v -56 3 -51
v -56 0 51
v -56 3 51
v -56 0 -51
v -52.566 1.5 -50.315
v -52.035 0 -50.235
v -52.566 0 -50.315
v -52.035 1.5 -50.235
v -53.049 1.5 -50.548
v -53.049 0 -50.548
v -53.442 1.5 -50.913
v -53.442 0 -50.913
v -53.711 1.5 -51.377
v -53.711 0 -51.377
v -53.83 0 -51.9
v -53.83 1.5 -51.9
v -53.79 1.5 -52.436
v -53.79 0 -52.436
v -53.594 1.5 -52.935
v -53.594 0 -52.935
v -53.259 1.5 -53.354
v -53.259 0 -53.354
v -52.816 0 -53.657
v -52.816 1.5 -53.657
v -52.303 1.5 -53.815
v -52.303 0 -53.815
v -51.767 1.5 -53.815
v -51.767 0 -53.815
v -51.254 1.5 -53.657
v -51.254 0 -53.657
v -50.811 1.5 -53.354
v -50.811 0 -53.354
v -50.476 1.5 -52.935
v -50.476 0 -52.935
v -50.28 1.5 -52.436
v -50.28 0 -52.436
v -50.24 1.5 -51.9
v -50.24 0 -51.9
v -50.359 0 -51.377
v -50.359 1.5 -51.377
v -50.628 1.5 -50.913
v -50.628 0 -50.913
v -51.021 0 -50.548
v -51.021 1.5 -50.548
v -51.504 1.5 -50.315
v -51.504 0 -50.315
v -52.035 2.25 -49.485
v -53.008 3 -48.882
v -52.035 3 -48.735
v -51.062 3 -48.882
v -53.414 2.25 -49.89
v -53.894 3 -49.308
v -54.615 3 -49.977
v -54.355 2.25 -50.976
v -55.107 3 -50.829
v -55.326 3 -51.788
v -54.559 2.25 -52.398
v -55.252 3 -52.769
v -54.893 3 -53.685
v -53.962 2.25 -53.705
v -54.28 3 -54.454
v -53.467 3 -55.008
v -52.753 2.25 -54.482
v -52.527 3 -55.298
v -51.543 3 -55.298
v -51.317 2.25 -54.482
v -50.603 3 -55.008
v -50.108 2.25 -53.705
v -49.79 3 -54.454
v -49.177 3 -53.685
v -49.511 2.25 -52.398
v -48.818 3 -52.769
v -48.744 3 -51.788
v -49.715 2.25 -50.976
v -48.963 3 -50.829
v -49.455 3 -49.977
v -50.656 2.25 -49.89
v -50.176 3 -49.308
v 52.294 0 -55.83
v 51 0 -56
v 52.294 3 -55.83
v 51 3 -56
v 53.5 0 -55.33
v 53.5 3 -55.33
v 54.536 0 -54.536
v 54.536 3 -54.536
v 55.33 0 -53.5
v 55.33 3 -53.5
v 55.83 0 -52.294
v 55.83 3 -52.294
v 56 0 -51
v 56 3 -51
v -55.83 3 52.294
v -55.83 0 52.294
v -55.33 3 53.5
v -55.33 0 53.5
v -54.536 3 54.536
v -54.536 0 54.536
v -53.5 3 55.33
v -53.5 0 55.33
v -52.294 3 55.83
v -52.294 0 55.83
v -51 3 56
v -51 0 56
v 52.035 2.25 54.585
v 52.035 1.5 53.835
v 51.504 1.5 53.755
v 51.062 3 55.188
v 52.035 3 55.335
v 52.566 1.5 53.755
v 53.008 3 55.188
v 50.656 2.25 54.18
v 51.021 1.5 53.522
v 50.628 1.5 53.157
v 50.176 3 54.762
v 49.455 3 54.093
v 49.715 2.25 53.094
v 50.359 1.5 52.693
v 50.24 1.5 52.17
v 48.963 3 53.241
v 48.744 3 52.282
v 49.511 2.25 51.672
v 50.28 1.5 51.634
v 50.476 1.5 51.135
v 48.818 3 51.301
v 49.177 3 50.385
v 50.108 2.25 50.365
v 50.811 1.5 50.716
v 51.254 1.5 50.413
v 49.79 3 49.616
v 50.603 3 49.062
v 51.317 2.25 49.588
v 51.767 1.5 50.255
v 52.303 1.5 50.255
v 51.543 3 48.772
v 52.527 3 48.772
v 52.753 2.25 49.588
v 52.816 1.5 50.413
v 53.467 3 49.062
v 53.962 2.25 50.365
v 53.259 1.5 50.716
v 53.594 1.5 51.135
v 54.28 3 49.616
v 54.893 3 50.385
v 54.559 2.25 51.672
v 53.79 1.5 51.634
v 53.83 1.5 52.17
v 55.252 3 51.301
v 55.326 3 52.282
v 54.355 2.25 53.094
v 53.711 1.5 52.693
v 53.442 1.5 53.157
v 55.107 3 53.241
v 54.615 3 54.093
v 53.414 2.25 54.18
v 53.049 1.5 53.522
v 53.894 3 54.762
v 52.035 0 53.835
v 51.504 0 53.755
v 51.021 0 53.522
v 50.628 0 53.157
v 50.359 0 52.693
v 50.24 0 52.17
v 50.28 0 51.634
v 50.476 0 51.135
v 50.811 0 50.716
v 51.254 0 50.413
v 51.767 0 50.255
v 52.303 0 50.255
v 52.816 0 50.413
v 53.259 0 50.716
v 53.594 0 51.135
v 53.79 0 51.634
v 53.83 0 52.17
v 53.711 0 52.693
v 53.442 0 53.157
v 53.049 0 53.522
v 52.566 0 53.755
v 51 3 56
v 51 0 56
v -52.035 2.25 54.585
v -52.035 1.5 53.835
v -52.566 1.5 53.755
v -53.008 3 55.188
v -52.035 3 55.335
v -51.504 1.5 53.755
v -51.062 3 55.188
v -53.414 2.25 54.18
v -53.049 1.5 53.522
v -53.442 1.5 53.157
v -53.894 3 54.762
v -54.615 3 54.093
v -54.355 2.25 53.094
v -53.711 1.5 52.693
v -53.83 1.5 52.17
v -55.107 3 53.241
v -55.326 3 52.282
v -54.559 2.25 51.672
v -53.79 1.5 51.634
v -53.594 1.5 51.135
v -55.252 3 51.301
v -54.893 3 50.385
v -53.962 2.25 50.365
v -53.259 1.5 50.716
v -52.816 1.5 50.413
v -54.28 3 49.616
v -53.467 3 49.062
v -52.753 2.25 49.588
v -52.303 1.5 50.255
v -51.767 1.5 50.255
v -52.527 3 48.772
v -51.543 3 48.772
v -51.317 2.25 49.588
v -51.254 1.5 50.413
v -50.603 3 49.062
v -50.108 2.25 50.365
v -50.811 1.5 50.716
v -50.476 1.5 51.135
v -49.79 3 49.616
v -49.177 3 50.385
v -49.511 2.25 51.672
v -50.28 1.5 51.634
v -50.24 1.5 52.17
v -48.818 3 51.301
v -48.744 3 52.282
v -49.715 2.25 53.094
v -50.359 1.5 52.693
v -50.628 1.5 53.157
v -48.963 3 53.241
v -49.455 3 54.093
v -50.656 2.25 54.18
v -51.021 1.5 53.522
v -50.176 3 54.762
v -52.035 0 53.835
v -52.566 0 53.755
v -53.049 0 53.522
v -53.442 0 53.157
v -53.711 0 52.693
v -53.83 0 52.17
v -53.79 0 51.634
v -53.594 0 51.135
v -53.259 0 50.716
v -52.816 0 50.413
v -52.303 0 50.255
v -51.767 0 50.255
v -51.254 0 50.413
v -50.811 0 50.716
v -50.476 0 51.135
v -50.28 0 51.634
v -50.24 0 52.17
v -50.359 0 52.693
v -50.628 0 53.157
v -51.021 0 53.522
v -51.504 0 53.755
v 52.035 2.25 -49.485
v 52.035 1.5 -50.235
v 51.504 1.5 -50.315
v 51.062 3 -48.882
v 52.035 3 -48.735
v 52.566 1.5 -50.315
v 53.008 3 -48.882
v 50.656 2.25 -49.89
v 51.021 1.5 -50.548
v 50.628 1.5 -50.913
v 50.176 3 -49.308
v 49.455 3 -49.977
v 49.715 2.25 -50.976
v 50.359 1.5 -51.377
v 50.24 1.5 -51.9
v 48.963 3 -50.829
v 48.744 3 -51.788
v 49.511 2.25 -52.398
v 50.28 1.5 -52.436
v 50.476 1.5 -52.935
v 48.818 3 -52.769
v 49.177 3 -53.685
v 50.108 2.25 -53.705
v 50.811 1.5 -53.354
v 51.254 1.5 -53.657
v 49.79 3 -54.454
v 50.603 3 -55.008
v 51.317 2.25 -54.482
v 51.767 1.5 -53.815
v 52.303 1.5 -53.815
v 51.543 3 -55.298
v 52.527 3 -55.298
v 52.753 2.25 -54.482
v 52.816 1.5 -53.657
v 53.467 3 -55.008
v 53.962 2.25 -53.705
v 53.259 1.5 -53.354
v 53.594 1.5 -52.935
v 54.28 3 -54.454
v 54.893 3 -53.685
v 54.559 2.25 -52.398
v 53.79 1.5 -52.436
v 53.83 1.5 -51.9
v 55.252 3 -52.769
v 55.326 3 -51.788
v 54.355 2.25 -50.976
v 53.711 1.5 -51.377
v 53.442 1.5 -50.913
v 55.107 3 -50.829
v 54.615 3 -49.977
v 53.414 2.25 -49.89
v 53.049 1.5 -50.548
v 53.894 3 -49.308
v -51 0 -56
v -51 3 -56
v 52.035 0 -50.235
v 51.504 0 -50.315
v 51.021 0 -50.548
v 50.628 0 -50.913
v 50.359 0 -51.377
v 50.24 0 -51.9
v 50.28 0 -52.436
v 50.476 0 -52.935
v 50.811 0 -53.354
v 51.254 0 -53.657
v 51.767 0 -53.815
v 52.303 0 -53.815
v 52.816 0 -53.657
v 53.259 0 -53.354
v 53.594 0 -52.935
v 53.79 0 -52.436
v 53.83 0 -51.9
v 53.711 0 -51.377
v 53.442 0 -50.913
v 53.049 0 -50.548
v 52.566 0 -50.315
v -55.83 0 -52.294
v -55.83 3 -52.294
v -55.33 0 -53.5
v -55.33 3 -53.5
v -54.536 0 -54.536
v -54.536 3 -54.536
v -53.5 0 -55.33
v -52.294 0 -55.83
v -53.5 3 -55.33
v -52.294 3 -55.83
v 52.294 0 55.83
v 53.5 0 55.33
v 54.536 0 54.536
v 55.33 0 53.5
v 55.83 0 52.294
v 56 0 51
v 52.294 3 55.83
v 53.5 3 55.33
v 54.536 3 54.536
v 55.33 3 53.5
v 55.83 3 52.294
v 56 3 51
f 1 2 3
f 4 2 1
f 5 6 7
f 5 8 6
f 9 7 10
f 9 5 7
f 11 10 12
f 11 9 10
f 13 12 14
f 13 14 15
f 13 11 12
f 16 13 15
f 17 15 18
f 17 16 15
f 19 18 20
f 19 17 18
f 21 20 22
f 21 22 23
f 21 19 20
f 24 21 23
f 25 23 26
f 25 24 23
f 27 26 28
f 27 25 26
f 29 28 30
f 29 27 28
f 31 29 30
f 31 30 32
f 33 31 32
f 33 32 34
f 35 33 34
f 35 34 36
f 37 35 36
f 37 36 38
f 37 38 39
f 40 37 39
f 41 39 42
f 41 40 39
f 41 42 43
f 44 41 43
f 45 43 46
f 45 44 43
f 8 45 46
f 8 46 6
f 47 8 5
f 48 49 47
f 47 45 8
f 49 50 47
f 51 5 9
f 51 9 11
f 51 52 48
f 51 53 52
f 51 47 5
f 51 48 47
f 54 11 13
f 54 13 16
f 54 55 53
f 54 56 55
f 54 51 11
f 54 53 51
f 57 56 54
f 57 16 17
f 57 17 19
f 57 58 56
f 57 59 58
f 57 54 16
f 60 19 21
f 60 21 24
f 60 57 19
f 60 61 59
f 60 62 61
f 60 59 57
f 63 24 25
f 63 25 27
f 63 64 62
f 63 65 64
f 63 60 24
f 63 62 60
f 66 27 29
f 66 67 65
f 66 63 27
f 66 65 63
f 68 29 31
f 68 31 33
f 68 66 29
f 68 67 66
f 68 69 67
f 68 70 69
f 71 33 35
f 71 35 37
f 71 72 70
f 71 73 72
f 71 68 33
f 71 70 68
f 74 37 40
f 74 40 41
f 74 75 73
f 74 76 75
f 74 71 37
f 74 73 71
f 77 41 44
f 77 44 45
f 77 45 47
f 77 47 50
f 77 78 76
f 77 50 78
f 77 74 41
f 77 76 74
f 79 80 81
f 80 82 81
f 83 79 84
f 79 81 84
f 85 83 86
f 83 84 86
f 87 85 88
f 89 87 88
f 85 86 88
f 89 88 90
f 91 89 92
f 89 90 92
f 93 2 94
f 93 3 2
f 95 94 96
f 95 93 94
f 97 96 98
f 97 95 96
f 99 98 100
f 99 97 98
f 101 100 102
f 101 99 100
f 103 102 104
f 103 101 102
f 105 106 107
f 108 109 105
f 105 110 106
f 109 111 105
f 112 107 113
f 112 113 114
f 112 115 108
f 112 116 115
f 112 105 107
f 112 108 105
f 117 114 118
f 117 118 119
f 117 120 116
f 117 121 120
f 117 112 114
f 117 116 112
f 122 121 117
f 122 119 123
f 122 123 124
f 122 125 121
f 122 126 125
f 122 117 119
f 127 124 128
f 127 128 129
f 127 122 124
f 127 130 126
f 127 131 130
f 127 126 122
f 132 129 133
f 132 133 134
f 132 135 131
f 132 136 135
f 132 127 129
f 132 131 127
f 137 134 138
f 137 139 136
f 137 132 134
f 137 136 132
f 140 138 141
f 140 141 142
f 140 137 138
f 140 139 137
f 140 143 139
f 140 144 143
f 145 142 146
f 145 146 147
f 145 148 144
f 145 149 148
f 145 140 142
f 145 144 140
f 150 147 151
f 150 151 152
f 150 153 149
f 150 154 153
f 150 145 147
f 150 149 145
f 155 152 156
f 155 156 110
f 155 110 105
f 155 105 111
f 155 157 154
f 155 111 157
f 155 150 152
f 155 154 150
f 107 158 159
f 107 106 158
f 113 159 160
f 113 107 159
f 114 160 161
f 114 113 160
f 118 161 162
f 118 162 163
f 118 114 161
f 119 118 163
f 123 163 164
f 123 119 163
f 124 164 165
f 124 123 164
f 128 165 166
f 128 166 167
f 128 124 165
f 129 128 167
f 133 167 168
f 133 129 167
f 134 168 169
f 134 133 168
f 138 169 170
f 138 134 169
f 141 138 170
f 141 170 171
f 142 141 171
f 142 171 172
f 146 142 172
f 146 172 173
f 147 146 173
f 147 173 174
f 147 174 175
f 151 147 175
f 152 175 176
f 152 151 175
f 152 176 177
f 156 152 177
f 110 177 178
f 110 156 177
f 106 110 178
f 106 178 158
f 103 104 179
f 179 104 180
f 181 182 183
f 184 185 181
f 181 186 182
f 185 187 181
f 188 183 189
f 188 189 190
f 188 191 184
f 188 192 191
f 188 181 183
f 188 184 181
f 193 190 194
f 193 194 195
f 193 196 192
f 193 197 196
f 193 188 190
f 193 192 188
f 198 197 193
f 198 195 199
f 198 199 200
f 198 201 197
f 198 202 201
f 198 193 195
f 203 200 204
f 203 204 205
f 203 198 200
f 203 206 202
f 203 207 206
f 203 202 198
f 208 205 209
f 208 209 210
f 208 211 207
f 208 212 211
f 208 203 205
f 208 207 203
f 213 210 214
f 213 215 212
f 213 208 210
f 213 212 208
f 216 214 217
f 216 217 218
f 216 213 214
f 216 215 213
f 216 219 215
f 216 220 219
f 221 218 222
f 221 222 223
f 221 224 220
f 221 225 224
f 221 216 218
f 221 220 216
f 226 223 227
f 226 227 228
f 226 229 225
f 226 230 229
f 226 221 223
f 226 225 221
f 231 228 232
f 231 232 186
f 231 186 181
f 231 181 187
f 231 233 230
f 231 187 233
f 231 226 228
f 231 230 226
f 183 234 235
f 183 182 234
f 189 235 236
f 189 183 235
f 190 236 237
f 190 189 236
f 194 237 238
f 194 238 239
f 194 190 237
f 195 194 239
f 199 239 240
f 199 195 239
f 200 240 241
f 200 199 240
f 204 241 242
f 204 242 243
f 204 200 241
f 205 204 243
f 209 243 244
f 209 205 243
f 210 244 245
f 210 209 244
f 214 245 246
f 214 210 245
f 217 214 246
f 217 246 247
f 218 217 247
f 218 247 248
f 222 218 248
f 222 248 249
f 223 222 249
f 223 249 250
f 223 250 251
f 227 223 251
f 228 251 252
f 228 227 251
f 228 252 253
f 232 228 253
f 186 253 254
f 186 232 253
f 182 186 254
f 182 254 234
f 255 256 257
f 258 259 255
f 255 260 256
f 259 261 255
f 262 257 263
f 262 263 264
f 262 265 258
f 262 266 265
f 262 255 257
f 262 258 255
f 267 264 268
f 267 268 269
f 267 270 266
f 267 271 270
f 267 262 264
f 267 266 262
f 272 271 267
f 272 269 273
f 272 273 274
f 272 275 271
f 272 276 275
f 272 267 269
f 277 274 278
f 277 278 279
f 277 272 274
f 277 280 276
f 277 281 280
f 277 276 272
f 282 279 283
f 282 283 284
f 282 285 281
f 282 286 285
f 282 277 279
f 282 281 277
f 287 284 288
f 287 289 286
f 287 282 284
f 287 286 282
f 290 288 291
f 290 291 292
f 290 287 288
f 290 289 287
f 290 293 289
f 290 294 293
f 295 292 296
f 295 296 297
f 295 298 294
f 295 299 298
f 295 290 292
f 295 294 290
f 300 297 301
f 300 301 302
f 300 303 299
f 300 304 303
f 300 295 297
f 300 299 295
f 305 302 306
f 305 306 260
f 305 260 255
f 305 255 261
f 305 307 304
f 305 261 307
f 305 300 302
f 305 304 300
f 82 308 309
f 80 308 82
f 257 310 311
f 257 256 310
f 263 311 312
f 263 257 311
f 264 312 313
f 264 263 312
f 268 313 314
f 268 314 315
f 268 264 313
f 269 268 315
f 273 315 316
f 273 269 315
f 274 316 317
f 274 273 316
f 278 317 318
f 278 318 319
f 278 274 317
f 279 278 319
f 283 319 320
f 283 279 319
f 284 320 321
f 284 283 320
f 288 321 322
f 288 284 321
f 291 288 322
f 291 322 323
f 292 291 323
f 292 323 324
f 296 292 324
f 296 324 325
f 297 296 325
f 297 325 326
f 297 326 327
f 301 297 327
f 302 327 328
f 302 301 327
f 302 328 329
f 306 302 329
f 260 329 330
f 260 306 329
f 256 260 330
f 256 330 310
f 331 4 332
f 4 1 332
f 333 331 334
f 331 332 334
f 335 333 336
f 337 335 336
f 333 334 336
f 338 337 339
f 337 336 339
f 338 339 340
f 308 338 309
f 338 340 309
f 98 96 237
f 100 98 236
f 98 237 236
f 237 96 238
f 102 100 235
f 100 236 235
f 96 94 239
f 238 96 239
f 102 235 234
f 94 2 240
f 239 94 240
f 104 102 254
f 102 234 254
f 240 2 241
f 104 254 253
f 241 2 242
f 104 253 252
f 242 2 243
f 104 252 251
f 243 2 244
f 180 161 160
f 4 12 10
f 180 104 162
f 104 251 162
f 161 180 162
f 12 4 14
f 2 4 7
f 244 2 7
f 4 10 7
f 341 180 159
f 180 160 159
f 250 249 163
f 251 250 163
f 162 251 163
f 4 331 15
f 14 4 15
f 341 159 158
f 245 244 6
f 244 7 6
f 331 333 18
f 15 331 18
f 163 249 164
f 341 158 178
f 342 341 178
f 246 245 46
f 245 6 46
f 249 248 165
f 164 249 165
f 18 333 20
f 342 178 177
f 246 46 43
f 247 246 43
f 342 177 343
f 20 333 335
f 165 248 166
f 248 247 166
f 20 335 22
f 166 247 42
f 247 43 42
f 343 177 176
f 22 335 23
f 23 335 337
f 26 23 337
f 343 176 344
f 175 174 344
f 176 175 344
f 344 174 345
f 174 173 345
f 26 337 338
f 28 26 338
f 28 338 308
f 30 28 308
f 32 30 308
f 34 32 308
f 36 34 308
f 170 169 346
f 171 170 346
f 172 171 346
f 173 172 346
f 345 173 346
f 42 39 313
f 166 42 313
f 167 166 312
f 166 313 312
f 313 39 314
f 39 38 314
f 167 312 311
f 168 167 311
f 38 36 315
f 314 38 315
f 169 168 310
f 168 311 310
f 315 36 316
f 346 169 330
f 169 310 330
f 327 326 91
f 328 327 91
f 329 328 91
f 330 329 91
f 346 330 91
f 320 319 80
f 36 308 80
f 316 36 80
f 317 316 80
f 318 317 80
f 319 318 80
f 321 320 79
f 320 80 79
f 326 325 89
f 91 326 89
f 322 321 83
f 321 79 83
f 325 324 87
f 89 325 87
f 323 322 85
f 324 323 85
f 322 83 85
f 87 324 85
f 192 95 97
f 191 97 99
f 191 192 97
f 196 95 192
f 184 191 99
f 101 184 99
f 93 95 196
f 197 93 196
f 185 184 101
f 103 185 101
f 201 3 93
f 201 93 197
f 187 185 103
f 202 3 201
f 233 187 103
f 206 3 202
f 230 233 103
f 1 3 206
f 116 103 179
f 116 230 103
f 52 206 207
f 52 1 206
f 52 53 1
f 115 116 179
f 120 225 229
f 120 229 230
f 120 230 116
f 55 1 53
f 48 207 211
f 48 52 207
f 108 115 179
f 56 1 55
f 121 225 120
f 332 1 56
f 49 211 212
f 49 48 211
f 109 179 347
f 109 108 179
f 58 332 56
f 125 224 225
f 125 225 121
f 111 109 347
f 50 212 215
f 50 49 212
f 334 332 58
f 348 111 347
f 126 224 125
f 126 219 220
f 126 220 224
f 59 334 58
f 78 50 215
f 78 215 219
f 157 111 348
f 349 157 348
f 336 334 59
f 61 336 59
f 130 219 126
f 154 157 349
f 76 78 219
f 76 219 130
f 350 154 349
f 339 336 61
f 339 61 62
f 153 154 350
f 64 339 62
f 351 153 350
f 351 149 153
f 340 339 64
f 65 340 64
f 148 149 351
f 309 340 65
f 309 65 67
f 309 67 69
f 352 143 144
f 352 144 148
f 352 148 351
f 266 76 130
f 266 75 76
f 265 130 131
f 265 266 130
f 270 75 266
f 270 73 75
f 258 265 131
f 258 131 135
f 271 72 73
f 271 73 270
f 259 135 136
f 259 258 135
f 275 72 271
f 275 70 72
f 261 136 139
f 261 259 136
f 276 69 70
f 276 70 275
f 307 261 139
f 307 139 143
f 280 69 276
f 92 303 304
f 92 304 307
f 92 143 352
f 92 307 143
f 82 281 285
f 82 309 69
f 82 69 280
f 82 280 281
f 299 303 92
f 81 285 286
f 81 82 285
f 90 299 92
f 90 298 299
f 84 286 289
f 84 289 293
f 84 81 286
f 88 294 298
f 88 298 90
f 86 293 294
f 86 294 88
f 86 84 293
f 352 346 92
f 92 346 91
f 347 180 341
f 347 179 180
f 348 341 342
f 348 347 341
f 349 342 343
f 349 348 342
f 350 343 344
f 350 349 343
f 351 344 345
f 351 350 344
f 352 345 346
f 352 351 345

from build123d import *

# Parameters (mm, degrees)
SKETCH_1_W                  = 112
SKETCH_1_H                  = 112
EXTRUDE_1_DEPTH             = 3
HOLE_WIZARD_M3_5_AT_2_COUNT = 2
HOLE_WIZARD_M3_5_AT_2_PITCH = 147.177205436
HOLE_WIZARD_M3_5_AT_3_COUNT = 2
HOLE_WIZARD_M3_5_AT_3_PITCH = 104.07
HOLE_WIZARD_M3_5_AT_4_COUNT = 2
HOLE_WIZARD_M3_5_AT_4_PITCH = 104.07
FILLET_1_R                  = 5


with BuildPart() as part:
    # 草图1 → 凸台-拉伸1 (new body)
    with BuildSketch(Plane(origin=(0, 0, 0), x_dir=(1, 0, 0), z_dir=(0, 1, 0))):
        Rectangle(SKETCH_1_W, SKETCH_1_H)
    extrude(amount=EXTRUDE_1_DEPTH)

    # 草图20 → M3 十字槽半沉头木螺钉的锥形沉头孔5 (revolve, cut)
    with BuildSketch(Plane(origin=(52.035, 3, 52.035), x_dir=(0, 0, 1), z_dir=(1, 0, 0))):
        Polygon((0, 0), (0, 3), (1.8, 3), (1.8, 1.5), (3.3, 0), align=None)
    hole_wizard_m3_5 = revolve(axis=Axis((52.035, 9.35, 52.035), (0, -1, 0)), mode=Mode.SUBTRACT)

    # M3 十字槽半沉头木螺钉的锥形沉头孔5 at 2: M3 十字槽半沉头木螺钉的锥形沉头孔5 ×2
    with Locations(*[Vector(-0.707106781, 0, -0.707106781) * (i * HOLE_WIZARD_M3_5_AT_2_PITCH) for i in range(1, HOLE_WIZARD_M3_5_AT_2_COUNT)]):
        add(hole_wizard_m3_5, mode=Mode.SUBTRACT)

    # M3 十字槽半沉头木螺钉的锥形沉头孔5 at 3: M3 十字槽半沉头木螺钉的锥形沉头孔5 ×2
    with Locations(*[(-i * HOLE_WIZARD_M3_5_AT_3_PITCH, 0, 0) for i in range(1, HOLE_WIZARD_M3_5_AT_3_COUNT)]):
        add(hole_wizard_m3_5, mode=Mode.SUBTRACT)

    # M3 十字槽半沉头木螺钉的锥形沉头孔5 at 4: M3 十字槽半沉头木螺钉的锥形沉头孔5 ×2
    with Locations(*[(0, 0, -i * HOLE_WIZARD_M3_5_AT_4_PITCH) for i in range(1, HOLE_WIZARD_M3_5_AT_4_COUNT)]):
        add(hole_wizard_m3_5, mode=Mode.SUBTRACT)

    # 圆角1
    fillet_1_edges = [part.edges().sort_by_distance(p)[0] for p in [
        (56, 1.5, 56),
        (-56, 1.5, 56),
        (-56, 1.5, -56),
        (56, 1.5, -56),
    ]]
    fillet(fillet_1_edges, radius=FILLET_1_R)


solid = part.part
